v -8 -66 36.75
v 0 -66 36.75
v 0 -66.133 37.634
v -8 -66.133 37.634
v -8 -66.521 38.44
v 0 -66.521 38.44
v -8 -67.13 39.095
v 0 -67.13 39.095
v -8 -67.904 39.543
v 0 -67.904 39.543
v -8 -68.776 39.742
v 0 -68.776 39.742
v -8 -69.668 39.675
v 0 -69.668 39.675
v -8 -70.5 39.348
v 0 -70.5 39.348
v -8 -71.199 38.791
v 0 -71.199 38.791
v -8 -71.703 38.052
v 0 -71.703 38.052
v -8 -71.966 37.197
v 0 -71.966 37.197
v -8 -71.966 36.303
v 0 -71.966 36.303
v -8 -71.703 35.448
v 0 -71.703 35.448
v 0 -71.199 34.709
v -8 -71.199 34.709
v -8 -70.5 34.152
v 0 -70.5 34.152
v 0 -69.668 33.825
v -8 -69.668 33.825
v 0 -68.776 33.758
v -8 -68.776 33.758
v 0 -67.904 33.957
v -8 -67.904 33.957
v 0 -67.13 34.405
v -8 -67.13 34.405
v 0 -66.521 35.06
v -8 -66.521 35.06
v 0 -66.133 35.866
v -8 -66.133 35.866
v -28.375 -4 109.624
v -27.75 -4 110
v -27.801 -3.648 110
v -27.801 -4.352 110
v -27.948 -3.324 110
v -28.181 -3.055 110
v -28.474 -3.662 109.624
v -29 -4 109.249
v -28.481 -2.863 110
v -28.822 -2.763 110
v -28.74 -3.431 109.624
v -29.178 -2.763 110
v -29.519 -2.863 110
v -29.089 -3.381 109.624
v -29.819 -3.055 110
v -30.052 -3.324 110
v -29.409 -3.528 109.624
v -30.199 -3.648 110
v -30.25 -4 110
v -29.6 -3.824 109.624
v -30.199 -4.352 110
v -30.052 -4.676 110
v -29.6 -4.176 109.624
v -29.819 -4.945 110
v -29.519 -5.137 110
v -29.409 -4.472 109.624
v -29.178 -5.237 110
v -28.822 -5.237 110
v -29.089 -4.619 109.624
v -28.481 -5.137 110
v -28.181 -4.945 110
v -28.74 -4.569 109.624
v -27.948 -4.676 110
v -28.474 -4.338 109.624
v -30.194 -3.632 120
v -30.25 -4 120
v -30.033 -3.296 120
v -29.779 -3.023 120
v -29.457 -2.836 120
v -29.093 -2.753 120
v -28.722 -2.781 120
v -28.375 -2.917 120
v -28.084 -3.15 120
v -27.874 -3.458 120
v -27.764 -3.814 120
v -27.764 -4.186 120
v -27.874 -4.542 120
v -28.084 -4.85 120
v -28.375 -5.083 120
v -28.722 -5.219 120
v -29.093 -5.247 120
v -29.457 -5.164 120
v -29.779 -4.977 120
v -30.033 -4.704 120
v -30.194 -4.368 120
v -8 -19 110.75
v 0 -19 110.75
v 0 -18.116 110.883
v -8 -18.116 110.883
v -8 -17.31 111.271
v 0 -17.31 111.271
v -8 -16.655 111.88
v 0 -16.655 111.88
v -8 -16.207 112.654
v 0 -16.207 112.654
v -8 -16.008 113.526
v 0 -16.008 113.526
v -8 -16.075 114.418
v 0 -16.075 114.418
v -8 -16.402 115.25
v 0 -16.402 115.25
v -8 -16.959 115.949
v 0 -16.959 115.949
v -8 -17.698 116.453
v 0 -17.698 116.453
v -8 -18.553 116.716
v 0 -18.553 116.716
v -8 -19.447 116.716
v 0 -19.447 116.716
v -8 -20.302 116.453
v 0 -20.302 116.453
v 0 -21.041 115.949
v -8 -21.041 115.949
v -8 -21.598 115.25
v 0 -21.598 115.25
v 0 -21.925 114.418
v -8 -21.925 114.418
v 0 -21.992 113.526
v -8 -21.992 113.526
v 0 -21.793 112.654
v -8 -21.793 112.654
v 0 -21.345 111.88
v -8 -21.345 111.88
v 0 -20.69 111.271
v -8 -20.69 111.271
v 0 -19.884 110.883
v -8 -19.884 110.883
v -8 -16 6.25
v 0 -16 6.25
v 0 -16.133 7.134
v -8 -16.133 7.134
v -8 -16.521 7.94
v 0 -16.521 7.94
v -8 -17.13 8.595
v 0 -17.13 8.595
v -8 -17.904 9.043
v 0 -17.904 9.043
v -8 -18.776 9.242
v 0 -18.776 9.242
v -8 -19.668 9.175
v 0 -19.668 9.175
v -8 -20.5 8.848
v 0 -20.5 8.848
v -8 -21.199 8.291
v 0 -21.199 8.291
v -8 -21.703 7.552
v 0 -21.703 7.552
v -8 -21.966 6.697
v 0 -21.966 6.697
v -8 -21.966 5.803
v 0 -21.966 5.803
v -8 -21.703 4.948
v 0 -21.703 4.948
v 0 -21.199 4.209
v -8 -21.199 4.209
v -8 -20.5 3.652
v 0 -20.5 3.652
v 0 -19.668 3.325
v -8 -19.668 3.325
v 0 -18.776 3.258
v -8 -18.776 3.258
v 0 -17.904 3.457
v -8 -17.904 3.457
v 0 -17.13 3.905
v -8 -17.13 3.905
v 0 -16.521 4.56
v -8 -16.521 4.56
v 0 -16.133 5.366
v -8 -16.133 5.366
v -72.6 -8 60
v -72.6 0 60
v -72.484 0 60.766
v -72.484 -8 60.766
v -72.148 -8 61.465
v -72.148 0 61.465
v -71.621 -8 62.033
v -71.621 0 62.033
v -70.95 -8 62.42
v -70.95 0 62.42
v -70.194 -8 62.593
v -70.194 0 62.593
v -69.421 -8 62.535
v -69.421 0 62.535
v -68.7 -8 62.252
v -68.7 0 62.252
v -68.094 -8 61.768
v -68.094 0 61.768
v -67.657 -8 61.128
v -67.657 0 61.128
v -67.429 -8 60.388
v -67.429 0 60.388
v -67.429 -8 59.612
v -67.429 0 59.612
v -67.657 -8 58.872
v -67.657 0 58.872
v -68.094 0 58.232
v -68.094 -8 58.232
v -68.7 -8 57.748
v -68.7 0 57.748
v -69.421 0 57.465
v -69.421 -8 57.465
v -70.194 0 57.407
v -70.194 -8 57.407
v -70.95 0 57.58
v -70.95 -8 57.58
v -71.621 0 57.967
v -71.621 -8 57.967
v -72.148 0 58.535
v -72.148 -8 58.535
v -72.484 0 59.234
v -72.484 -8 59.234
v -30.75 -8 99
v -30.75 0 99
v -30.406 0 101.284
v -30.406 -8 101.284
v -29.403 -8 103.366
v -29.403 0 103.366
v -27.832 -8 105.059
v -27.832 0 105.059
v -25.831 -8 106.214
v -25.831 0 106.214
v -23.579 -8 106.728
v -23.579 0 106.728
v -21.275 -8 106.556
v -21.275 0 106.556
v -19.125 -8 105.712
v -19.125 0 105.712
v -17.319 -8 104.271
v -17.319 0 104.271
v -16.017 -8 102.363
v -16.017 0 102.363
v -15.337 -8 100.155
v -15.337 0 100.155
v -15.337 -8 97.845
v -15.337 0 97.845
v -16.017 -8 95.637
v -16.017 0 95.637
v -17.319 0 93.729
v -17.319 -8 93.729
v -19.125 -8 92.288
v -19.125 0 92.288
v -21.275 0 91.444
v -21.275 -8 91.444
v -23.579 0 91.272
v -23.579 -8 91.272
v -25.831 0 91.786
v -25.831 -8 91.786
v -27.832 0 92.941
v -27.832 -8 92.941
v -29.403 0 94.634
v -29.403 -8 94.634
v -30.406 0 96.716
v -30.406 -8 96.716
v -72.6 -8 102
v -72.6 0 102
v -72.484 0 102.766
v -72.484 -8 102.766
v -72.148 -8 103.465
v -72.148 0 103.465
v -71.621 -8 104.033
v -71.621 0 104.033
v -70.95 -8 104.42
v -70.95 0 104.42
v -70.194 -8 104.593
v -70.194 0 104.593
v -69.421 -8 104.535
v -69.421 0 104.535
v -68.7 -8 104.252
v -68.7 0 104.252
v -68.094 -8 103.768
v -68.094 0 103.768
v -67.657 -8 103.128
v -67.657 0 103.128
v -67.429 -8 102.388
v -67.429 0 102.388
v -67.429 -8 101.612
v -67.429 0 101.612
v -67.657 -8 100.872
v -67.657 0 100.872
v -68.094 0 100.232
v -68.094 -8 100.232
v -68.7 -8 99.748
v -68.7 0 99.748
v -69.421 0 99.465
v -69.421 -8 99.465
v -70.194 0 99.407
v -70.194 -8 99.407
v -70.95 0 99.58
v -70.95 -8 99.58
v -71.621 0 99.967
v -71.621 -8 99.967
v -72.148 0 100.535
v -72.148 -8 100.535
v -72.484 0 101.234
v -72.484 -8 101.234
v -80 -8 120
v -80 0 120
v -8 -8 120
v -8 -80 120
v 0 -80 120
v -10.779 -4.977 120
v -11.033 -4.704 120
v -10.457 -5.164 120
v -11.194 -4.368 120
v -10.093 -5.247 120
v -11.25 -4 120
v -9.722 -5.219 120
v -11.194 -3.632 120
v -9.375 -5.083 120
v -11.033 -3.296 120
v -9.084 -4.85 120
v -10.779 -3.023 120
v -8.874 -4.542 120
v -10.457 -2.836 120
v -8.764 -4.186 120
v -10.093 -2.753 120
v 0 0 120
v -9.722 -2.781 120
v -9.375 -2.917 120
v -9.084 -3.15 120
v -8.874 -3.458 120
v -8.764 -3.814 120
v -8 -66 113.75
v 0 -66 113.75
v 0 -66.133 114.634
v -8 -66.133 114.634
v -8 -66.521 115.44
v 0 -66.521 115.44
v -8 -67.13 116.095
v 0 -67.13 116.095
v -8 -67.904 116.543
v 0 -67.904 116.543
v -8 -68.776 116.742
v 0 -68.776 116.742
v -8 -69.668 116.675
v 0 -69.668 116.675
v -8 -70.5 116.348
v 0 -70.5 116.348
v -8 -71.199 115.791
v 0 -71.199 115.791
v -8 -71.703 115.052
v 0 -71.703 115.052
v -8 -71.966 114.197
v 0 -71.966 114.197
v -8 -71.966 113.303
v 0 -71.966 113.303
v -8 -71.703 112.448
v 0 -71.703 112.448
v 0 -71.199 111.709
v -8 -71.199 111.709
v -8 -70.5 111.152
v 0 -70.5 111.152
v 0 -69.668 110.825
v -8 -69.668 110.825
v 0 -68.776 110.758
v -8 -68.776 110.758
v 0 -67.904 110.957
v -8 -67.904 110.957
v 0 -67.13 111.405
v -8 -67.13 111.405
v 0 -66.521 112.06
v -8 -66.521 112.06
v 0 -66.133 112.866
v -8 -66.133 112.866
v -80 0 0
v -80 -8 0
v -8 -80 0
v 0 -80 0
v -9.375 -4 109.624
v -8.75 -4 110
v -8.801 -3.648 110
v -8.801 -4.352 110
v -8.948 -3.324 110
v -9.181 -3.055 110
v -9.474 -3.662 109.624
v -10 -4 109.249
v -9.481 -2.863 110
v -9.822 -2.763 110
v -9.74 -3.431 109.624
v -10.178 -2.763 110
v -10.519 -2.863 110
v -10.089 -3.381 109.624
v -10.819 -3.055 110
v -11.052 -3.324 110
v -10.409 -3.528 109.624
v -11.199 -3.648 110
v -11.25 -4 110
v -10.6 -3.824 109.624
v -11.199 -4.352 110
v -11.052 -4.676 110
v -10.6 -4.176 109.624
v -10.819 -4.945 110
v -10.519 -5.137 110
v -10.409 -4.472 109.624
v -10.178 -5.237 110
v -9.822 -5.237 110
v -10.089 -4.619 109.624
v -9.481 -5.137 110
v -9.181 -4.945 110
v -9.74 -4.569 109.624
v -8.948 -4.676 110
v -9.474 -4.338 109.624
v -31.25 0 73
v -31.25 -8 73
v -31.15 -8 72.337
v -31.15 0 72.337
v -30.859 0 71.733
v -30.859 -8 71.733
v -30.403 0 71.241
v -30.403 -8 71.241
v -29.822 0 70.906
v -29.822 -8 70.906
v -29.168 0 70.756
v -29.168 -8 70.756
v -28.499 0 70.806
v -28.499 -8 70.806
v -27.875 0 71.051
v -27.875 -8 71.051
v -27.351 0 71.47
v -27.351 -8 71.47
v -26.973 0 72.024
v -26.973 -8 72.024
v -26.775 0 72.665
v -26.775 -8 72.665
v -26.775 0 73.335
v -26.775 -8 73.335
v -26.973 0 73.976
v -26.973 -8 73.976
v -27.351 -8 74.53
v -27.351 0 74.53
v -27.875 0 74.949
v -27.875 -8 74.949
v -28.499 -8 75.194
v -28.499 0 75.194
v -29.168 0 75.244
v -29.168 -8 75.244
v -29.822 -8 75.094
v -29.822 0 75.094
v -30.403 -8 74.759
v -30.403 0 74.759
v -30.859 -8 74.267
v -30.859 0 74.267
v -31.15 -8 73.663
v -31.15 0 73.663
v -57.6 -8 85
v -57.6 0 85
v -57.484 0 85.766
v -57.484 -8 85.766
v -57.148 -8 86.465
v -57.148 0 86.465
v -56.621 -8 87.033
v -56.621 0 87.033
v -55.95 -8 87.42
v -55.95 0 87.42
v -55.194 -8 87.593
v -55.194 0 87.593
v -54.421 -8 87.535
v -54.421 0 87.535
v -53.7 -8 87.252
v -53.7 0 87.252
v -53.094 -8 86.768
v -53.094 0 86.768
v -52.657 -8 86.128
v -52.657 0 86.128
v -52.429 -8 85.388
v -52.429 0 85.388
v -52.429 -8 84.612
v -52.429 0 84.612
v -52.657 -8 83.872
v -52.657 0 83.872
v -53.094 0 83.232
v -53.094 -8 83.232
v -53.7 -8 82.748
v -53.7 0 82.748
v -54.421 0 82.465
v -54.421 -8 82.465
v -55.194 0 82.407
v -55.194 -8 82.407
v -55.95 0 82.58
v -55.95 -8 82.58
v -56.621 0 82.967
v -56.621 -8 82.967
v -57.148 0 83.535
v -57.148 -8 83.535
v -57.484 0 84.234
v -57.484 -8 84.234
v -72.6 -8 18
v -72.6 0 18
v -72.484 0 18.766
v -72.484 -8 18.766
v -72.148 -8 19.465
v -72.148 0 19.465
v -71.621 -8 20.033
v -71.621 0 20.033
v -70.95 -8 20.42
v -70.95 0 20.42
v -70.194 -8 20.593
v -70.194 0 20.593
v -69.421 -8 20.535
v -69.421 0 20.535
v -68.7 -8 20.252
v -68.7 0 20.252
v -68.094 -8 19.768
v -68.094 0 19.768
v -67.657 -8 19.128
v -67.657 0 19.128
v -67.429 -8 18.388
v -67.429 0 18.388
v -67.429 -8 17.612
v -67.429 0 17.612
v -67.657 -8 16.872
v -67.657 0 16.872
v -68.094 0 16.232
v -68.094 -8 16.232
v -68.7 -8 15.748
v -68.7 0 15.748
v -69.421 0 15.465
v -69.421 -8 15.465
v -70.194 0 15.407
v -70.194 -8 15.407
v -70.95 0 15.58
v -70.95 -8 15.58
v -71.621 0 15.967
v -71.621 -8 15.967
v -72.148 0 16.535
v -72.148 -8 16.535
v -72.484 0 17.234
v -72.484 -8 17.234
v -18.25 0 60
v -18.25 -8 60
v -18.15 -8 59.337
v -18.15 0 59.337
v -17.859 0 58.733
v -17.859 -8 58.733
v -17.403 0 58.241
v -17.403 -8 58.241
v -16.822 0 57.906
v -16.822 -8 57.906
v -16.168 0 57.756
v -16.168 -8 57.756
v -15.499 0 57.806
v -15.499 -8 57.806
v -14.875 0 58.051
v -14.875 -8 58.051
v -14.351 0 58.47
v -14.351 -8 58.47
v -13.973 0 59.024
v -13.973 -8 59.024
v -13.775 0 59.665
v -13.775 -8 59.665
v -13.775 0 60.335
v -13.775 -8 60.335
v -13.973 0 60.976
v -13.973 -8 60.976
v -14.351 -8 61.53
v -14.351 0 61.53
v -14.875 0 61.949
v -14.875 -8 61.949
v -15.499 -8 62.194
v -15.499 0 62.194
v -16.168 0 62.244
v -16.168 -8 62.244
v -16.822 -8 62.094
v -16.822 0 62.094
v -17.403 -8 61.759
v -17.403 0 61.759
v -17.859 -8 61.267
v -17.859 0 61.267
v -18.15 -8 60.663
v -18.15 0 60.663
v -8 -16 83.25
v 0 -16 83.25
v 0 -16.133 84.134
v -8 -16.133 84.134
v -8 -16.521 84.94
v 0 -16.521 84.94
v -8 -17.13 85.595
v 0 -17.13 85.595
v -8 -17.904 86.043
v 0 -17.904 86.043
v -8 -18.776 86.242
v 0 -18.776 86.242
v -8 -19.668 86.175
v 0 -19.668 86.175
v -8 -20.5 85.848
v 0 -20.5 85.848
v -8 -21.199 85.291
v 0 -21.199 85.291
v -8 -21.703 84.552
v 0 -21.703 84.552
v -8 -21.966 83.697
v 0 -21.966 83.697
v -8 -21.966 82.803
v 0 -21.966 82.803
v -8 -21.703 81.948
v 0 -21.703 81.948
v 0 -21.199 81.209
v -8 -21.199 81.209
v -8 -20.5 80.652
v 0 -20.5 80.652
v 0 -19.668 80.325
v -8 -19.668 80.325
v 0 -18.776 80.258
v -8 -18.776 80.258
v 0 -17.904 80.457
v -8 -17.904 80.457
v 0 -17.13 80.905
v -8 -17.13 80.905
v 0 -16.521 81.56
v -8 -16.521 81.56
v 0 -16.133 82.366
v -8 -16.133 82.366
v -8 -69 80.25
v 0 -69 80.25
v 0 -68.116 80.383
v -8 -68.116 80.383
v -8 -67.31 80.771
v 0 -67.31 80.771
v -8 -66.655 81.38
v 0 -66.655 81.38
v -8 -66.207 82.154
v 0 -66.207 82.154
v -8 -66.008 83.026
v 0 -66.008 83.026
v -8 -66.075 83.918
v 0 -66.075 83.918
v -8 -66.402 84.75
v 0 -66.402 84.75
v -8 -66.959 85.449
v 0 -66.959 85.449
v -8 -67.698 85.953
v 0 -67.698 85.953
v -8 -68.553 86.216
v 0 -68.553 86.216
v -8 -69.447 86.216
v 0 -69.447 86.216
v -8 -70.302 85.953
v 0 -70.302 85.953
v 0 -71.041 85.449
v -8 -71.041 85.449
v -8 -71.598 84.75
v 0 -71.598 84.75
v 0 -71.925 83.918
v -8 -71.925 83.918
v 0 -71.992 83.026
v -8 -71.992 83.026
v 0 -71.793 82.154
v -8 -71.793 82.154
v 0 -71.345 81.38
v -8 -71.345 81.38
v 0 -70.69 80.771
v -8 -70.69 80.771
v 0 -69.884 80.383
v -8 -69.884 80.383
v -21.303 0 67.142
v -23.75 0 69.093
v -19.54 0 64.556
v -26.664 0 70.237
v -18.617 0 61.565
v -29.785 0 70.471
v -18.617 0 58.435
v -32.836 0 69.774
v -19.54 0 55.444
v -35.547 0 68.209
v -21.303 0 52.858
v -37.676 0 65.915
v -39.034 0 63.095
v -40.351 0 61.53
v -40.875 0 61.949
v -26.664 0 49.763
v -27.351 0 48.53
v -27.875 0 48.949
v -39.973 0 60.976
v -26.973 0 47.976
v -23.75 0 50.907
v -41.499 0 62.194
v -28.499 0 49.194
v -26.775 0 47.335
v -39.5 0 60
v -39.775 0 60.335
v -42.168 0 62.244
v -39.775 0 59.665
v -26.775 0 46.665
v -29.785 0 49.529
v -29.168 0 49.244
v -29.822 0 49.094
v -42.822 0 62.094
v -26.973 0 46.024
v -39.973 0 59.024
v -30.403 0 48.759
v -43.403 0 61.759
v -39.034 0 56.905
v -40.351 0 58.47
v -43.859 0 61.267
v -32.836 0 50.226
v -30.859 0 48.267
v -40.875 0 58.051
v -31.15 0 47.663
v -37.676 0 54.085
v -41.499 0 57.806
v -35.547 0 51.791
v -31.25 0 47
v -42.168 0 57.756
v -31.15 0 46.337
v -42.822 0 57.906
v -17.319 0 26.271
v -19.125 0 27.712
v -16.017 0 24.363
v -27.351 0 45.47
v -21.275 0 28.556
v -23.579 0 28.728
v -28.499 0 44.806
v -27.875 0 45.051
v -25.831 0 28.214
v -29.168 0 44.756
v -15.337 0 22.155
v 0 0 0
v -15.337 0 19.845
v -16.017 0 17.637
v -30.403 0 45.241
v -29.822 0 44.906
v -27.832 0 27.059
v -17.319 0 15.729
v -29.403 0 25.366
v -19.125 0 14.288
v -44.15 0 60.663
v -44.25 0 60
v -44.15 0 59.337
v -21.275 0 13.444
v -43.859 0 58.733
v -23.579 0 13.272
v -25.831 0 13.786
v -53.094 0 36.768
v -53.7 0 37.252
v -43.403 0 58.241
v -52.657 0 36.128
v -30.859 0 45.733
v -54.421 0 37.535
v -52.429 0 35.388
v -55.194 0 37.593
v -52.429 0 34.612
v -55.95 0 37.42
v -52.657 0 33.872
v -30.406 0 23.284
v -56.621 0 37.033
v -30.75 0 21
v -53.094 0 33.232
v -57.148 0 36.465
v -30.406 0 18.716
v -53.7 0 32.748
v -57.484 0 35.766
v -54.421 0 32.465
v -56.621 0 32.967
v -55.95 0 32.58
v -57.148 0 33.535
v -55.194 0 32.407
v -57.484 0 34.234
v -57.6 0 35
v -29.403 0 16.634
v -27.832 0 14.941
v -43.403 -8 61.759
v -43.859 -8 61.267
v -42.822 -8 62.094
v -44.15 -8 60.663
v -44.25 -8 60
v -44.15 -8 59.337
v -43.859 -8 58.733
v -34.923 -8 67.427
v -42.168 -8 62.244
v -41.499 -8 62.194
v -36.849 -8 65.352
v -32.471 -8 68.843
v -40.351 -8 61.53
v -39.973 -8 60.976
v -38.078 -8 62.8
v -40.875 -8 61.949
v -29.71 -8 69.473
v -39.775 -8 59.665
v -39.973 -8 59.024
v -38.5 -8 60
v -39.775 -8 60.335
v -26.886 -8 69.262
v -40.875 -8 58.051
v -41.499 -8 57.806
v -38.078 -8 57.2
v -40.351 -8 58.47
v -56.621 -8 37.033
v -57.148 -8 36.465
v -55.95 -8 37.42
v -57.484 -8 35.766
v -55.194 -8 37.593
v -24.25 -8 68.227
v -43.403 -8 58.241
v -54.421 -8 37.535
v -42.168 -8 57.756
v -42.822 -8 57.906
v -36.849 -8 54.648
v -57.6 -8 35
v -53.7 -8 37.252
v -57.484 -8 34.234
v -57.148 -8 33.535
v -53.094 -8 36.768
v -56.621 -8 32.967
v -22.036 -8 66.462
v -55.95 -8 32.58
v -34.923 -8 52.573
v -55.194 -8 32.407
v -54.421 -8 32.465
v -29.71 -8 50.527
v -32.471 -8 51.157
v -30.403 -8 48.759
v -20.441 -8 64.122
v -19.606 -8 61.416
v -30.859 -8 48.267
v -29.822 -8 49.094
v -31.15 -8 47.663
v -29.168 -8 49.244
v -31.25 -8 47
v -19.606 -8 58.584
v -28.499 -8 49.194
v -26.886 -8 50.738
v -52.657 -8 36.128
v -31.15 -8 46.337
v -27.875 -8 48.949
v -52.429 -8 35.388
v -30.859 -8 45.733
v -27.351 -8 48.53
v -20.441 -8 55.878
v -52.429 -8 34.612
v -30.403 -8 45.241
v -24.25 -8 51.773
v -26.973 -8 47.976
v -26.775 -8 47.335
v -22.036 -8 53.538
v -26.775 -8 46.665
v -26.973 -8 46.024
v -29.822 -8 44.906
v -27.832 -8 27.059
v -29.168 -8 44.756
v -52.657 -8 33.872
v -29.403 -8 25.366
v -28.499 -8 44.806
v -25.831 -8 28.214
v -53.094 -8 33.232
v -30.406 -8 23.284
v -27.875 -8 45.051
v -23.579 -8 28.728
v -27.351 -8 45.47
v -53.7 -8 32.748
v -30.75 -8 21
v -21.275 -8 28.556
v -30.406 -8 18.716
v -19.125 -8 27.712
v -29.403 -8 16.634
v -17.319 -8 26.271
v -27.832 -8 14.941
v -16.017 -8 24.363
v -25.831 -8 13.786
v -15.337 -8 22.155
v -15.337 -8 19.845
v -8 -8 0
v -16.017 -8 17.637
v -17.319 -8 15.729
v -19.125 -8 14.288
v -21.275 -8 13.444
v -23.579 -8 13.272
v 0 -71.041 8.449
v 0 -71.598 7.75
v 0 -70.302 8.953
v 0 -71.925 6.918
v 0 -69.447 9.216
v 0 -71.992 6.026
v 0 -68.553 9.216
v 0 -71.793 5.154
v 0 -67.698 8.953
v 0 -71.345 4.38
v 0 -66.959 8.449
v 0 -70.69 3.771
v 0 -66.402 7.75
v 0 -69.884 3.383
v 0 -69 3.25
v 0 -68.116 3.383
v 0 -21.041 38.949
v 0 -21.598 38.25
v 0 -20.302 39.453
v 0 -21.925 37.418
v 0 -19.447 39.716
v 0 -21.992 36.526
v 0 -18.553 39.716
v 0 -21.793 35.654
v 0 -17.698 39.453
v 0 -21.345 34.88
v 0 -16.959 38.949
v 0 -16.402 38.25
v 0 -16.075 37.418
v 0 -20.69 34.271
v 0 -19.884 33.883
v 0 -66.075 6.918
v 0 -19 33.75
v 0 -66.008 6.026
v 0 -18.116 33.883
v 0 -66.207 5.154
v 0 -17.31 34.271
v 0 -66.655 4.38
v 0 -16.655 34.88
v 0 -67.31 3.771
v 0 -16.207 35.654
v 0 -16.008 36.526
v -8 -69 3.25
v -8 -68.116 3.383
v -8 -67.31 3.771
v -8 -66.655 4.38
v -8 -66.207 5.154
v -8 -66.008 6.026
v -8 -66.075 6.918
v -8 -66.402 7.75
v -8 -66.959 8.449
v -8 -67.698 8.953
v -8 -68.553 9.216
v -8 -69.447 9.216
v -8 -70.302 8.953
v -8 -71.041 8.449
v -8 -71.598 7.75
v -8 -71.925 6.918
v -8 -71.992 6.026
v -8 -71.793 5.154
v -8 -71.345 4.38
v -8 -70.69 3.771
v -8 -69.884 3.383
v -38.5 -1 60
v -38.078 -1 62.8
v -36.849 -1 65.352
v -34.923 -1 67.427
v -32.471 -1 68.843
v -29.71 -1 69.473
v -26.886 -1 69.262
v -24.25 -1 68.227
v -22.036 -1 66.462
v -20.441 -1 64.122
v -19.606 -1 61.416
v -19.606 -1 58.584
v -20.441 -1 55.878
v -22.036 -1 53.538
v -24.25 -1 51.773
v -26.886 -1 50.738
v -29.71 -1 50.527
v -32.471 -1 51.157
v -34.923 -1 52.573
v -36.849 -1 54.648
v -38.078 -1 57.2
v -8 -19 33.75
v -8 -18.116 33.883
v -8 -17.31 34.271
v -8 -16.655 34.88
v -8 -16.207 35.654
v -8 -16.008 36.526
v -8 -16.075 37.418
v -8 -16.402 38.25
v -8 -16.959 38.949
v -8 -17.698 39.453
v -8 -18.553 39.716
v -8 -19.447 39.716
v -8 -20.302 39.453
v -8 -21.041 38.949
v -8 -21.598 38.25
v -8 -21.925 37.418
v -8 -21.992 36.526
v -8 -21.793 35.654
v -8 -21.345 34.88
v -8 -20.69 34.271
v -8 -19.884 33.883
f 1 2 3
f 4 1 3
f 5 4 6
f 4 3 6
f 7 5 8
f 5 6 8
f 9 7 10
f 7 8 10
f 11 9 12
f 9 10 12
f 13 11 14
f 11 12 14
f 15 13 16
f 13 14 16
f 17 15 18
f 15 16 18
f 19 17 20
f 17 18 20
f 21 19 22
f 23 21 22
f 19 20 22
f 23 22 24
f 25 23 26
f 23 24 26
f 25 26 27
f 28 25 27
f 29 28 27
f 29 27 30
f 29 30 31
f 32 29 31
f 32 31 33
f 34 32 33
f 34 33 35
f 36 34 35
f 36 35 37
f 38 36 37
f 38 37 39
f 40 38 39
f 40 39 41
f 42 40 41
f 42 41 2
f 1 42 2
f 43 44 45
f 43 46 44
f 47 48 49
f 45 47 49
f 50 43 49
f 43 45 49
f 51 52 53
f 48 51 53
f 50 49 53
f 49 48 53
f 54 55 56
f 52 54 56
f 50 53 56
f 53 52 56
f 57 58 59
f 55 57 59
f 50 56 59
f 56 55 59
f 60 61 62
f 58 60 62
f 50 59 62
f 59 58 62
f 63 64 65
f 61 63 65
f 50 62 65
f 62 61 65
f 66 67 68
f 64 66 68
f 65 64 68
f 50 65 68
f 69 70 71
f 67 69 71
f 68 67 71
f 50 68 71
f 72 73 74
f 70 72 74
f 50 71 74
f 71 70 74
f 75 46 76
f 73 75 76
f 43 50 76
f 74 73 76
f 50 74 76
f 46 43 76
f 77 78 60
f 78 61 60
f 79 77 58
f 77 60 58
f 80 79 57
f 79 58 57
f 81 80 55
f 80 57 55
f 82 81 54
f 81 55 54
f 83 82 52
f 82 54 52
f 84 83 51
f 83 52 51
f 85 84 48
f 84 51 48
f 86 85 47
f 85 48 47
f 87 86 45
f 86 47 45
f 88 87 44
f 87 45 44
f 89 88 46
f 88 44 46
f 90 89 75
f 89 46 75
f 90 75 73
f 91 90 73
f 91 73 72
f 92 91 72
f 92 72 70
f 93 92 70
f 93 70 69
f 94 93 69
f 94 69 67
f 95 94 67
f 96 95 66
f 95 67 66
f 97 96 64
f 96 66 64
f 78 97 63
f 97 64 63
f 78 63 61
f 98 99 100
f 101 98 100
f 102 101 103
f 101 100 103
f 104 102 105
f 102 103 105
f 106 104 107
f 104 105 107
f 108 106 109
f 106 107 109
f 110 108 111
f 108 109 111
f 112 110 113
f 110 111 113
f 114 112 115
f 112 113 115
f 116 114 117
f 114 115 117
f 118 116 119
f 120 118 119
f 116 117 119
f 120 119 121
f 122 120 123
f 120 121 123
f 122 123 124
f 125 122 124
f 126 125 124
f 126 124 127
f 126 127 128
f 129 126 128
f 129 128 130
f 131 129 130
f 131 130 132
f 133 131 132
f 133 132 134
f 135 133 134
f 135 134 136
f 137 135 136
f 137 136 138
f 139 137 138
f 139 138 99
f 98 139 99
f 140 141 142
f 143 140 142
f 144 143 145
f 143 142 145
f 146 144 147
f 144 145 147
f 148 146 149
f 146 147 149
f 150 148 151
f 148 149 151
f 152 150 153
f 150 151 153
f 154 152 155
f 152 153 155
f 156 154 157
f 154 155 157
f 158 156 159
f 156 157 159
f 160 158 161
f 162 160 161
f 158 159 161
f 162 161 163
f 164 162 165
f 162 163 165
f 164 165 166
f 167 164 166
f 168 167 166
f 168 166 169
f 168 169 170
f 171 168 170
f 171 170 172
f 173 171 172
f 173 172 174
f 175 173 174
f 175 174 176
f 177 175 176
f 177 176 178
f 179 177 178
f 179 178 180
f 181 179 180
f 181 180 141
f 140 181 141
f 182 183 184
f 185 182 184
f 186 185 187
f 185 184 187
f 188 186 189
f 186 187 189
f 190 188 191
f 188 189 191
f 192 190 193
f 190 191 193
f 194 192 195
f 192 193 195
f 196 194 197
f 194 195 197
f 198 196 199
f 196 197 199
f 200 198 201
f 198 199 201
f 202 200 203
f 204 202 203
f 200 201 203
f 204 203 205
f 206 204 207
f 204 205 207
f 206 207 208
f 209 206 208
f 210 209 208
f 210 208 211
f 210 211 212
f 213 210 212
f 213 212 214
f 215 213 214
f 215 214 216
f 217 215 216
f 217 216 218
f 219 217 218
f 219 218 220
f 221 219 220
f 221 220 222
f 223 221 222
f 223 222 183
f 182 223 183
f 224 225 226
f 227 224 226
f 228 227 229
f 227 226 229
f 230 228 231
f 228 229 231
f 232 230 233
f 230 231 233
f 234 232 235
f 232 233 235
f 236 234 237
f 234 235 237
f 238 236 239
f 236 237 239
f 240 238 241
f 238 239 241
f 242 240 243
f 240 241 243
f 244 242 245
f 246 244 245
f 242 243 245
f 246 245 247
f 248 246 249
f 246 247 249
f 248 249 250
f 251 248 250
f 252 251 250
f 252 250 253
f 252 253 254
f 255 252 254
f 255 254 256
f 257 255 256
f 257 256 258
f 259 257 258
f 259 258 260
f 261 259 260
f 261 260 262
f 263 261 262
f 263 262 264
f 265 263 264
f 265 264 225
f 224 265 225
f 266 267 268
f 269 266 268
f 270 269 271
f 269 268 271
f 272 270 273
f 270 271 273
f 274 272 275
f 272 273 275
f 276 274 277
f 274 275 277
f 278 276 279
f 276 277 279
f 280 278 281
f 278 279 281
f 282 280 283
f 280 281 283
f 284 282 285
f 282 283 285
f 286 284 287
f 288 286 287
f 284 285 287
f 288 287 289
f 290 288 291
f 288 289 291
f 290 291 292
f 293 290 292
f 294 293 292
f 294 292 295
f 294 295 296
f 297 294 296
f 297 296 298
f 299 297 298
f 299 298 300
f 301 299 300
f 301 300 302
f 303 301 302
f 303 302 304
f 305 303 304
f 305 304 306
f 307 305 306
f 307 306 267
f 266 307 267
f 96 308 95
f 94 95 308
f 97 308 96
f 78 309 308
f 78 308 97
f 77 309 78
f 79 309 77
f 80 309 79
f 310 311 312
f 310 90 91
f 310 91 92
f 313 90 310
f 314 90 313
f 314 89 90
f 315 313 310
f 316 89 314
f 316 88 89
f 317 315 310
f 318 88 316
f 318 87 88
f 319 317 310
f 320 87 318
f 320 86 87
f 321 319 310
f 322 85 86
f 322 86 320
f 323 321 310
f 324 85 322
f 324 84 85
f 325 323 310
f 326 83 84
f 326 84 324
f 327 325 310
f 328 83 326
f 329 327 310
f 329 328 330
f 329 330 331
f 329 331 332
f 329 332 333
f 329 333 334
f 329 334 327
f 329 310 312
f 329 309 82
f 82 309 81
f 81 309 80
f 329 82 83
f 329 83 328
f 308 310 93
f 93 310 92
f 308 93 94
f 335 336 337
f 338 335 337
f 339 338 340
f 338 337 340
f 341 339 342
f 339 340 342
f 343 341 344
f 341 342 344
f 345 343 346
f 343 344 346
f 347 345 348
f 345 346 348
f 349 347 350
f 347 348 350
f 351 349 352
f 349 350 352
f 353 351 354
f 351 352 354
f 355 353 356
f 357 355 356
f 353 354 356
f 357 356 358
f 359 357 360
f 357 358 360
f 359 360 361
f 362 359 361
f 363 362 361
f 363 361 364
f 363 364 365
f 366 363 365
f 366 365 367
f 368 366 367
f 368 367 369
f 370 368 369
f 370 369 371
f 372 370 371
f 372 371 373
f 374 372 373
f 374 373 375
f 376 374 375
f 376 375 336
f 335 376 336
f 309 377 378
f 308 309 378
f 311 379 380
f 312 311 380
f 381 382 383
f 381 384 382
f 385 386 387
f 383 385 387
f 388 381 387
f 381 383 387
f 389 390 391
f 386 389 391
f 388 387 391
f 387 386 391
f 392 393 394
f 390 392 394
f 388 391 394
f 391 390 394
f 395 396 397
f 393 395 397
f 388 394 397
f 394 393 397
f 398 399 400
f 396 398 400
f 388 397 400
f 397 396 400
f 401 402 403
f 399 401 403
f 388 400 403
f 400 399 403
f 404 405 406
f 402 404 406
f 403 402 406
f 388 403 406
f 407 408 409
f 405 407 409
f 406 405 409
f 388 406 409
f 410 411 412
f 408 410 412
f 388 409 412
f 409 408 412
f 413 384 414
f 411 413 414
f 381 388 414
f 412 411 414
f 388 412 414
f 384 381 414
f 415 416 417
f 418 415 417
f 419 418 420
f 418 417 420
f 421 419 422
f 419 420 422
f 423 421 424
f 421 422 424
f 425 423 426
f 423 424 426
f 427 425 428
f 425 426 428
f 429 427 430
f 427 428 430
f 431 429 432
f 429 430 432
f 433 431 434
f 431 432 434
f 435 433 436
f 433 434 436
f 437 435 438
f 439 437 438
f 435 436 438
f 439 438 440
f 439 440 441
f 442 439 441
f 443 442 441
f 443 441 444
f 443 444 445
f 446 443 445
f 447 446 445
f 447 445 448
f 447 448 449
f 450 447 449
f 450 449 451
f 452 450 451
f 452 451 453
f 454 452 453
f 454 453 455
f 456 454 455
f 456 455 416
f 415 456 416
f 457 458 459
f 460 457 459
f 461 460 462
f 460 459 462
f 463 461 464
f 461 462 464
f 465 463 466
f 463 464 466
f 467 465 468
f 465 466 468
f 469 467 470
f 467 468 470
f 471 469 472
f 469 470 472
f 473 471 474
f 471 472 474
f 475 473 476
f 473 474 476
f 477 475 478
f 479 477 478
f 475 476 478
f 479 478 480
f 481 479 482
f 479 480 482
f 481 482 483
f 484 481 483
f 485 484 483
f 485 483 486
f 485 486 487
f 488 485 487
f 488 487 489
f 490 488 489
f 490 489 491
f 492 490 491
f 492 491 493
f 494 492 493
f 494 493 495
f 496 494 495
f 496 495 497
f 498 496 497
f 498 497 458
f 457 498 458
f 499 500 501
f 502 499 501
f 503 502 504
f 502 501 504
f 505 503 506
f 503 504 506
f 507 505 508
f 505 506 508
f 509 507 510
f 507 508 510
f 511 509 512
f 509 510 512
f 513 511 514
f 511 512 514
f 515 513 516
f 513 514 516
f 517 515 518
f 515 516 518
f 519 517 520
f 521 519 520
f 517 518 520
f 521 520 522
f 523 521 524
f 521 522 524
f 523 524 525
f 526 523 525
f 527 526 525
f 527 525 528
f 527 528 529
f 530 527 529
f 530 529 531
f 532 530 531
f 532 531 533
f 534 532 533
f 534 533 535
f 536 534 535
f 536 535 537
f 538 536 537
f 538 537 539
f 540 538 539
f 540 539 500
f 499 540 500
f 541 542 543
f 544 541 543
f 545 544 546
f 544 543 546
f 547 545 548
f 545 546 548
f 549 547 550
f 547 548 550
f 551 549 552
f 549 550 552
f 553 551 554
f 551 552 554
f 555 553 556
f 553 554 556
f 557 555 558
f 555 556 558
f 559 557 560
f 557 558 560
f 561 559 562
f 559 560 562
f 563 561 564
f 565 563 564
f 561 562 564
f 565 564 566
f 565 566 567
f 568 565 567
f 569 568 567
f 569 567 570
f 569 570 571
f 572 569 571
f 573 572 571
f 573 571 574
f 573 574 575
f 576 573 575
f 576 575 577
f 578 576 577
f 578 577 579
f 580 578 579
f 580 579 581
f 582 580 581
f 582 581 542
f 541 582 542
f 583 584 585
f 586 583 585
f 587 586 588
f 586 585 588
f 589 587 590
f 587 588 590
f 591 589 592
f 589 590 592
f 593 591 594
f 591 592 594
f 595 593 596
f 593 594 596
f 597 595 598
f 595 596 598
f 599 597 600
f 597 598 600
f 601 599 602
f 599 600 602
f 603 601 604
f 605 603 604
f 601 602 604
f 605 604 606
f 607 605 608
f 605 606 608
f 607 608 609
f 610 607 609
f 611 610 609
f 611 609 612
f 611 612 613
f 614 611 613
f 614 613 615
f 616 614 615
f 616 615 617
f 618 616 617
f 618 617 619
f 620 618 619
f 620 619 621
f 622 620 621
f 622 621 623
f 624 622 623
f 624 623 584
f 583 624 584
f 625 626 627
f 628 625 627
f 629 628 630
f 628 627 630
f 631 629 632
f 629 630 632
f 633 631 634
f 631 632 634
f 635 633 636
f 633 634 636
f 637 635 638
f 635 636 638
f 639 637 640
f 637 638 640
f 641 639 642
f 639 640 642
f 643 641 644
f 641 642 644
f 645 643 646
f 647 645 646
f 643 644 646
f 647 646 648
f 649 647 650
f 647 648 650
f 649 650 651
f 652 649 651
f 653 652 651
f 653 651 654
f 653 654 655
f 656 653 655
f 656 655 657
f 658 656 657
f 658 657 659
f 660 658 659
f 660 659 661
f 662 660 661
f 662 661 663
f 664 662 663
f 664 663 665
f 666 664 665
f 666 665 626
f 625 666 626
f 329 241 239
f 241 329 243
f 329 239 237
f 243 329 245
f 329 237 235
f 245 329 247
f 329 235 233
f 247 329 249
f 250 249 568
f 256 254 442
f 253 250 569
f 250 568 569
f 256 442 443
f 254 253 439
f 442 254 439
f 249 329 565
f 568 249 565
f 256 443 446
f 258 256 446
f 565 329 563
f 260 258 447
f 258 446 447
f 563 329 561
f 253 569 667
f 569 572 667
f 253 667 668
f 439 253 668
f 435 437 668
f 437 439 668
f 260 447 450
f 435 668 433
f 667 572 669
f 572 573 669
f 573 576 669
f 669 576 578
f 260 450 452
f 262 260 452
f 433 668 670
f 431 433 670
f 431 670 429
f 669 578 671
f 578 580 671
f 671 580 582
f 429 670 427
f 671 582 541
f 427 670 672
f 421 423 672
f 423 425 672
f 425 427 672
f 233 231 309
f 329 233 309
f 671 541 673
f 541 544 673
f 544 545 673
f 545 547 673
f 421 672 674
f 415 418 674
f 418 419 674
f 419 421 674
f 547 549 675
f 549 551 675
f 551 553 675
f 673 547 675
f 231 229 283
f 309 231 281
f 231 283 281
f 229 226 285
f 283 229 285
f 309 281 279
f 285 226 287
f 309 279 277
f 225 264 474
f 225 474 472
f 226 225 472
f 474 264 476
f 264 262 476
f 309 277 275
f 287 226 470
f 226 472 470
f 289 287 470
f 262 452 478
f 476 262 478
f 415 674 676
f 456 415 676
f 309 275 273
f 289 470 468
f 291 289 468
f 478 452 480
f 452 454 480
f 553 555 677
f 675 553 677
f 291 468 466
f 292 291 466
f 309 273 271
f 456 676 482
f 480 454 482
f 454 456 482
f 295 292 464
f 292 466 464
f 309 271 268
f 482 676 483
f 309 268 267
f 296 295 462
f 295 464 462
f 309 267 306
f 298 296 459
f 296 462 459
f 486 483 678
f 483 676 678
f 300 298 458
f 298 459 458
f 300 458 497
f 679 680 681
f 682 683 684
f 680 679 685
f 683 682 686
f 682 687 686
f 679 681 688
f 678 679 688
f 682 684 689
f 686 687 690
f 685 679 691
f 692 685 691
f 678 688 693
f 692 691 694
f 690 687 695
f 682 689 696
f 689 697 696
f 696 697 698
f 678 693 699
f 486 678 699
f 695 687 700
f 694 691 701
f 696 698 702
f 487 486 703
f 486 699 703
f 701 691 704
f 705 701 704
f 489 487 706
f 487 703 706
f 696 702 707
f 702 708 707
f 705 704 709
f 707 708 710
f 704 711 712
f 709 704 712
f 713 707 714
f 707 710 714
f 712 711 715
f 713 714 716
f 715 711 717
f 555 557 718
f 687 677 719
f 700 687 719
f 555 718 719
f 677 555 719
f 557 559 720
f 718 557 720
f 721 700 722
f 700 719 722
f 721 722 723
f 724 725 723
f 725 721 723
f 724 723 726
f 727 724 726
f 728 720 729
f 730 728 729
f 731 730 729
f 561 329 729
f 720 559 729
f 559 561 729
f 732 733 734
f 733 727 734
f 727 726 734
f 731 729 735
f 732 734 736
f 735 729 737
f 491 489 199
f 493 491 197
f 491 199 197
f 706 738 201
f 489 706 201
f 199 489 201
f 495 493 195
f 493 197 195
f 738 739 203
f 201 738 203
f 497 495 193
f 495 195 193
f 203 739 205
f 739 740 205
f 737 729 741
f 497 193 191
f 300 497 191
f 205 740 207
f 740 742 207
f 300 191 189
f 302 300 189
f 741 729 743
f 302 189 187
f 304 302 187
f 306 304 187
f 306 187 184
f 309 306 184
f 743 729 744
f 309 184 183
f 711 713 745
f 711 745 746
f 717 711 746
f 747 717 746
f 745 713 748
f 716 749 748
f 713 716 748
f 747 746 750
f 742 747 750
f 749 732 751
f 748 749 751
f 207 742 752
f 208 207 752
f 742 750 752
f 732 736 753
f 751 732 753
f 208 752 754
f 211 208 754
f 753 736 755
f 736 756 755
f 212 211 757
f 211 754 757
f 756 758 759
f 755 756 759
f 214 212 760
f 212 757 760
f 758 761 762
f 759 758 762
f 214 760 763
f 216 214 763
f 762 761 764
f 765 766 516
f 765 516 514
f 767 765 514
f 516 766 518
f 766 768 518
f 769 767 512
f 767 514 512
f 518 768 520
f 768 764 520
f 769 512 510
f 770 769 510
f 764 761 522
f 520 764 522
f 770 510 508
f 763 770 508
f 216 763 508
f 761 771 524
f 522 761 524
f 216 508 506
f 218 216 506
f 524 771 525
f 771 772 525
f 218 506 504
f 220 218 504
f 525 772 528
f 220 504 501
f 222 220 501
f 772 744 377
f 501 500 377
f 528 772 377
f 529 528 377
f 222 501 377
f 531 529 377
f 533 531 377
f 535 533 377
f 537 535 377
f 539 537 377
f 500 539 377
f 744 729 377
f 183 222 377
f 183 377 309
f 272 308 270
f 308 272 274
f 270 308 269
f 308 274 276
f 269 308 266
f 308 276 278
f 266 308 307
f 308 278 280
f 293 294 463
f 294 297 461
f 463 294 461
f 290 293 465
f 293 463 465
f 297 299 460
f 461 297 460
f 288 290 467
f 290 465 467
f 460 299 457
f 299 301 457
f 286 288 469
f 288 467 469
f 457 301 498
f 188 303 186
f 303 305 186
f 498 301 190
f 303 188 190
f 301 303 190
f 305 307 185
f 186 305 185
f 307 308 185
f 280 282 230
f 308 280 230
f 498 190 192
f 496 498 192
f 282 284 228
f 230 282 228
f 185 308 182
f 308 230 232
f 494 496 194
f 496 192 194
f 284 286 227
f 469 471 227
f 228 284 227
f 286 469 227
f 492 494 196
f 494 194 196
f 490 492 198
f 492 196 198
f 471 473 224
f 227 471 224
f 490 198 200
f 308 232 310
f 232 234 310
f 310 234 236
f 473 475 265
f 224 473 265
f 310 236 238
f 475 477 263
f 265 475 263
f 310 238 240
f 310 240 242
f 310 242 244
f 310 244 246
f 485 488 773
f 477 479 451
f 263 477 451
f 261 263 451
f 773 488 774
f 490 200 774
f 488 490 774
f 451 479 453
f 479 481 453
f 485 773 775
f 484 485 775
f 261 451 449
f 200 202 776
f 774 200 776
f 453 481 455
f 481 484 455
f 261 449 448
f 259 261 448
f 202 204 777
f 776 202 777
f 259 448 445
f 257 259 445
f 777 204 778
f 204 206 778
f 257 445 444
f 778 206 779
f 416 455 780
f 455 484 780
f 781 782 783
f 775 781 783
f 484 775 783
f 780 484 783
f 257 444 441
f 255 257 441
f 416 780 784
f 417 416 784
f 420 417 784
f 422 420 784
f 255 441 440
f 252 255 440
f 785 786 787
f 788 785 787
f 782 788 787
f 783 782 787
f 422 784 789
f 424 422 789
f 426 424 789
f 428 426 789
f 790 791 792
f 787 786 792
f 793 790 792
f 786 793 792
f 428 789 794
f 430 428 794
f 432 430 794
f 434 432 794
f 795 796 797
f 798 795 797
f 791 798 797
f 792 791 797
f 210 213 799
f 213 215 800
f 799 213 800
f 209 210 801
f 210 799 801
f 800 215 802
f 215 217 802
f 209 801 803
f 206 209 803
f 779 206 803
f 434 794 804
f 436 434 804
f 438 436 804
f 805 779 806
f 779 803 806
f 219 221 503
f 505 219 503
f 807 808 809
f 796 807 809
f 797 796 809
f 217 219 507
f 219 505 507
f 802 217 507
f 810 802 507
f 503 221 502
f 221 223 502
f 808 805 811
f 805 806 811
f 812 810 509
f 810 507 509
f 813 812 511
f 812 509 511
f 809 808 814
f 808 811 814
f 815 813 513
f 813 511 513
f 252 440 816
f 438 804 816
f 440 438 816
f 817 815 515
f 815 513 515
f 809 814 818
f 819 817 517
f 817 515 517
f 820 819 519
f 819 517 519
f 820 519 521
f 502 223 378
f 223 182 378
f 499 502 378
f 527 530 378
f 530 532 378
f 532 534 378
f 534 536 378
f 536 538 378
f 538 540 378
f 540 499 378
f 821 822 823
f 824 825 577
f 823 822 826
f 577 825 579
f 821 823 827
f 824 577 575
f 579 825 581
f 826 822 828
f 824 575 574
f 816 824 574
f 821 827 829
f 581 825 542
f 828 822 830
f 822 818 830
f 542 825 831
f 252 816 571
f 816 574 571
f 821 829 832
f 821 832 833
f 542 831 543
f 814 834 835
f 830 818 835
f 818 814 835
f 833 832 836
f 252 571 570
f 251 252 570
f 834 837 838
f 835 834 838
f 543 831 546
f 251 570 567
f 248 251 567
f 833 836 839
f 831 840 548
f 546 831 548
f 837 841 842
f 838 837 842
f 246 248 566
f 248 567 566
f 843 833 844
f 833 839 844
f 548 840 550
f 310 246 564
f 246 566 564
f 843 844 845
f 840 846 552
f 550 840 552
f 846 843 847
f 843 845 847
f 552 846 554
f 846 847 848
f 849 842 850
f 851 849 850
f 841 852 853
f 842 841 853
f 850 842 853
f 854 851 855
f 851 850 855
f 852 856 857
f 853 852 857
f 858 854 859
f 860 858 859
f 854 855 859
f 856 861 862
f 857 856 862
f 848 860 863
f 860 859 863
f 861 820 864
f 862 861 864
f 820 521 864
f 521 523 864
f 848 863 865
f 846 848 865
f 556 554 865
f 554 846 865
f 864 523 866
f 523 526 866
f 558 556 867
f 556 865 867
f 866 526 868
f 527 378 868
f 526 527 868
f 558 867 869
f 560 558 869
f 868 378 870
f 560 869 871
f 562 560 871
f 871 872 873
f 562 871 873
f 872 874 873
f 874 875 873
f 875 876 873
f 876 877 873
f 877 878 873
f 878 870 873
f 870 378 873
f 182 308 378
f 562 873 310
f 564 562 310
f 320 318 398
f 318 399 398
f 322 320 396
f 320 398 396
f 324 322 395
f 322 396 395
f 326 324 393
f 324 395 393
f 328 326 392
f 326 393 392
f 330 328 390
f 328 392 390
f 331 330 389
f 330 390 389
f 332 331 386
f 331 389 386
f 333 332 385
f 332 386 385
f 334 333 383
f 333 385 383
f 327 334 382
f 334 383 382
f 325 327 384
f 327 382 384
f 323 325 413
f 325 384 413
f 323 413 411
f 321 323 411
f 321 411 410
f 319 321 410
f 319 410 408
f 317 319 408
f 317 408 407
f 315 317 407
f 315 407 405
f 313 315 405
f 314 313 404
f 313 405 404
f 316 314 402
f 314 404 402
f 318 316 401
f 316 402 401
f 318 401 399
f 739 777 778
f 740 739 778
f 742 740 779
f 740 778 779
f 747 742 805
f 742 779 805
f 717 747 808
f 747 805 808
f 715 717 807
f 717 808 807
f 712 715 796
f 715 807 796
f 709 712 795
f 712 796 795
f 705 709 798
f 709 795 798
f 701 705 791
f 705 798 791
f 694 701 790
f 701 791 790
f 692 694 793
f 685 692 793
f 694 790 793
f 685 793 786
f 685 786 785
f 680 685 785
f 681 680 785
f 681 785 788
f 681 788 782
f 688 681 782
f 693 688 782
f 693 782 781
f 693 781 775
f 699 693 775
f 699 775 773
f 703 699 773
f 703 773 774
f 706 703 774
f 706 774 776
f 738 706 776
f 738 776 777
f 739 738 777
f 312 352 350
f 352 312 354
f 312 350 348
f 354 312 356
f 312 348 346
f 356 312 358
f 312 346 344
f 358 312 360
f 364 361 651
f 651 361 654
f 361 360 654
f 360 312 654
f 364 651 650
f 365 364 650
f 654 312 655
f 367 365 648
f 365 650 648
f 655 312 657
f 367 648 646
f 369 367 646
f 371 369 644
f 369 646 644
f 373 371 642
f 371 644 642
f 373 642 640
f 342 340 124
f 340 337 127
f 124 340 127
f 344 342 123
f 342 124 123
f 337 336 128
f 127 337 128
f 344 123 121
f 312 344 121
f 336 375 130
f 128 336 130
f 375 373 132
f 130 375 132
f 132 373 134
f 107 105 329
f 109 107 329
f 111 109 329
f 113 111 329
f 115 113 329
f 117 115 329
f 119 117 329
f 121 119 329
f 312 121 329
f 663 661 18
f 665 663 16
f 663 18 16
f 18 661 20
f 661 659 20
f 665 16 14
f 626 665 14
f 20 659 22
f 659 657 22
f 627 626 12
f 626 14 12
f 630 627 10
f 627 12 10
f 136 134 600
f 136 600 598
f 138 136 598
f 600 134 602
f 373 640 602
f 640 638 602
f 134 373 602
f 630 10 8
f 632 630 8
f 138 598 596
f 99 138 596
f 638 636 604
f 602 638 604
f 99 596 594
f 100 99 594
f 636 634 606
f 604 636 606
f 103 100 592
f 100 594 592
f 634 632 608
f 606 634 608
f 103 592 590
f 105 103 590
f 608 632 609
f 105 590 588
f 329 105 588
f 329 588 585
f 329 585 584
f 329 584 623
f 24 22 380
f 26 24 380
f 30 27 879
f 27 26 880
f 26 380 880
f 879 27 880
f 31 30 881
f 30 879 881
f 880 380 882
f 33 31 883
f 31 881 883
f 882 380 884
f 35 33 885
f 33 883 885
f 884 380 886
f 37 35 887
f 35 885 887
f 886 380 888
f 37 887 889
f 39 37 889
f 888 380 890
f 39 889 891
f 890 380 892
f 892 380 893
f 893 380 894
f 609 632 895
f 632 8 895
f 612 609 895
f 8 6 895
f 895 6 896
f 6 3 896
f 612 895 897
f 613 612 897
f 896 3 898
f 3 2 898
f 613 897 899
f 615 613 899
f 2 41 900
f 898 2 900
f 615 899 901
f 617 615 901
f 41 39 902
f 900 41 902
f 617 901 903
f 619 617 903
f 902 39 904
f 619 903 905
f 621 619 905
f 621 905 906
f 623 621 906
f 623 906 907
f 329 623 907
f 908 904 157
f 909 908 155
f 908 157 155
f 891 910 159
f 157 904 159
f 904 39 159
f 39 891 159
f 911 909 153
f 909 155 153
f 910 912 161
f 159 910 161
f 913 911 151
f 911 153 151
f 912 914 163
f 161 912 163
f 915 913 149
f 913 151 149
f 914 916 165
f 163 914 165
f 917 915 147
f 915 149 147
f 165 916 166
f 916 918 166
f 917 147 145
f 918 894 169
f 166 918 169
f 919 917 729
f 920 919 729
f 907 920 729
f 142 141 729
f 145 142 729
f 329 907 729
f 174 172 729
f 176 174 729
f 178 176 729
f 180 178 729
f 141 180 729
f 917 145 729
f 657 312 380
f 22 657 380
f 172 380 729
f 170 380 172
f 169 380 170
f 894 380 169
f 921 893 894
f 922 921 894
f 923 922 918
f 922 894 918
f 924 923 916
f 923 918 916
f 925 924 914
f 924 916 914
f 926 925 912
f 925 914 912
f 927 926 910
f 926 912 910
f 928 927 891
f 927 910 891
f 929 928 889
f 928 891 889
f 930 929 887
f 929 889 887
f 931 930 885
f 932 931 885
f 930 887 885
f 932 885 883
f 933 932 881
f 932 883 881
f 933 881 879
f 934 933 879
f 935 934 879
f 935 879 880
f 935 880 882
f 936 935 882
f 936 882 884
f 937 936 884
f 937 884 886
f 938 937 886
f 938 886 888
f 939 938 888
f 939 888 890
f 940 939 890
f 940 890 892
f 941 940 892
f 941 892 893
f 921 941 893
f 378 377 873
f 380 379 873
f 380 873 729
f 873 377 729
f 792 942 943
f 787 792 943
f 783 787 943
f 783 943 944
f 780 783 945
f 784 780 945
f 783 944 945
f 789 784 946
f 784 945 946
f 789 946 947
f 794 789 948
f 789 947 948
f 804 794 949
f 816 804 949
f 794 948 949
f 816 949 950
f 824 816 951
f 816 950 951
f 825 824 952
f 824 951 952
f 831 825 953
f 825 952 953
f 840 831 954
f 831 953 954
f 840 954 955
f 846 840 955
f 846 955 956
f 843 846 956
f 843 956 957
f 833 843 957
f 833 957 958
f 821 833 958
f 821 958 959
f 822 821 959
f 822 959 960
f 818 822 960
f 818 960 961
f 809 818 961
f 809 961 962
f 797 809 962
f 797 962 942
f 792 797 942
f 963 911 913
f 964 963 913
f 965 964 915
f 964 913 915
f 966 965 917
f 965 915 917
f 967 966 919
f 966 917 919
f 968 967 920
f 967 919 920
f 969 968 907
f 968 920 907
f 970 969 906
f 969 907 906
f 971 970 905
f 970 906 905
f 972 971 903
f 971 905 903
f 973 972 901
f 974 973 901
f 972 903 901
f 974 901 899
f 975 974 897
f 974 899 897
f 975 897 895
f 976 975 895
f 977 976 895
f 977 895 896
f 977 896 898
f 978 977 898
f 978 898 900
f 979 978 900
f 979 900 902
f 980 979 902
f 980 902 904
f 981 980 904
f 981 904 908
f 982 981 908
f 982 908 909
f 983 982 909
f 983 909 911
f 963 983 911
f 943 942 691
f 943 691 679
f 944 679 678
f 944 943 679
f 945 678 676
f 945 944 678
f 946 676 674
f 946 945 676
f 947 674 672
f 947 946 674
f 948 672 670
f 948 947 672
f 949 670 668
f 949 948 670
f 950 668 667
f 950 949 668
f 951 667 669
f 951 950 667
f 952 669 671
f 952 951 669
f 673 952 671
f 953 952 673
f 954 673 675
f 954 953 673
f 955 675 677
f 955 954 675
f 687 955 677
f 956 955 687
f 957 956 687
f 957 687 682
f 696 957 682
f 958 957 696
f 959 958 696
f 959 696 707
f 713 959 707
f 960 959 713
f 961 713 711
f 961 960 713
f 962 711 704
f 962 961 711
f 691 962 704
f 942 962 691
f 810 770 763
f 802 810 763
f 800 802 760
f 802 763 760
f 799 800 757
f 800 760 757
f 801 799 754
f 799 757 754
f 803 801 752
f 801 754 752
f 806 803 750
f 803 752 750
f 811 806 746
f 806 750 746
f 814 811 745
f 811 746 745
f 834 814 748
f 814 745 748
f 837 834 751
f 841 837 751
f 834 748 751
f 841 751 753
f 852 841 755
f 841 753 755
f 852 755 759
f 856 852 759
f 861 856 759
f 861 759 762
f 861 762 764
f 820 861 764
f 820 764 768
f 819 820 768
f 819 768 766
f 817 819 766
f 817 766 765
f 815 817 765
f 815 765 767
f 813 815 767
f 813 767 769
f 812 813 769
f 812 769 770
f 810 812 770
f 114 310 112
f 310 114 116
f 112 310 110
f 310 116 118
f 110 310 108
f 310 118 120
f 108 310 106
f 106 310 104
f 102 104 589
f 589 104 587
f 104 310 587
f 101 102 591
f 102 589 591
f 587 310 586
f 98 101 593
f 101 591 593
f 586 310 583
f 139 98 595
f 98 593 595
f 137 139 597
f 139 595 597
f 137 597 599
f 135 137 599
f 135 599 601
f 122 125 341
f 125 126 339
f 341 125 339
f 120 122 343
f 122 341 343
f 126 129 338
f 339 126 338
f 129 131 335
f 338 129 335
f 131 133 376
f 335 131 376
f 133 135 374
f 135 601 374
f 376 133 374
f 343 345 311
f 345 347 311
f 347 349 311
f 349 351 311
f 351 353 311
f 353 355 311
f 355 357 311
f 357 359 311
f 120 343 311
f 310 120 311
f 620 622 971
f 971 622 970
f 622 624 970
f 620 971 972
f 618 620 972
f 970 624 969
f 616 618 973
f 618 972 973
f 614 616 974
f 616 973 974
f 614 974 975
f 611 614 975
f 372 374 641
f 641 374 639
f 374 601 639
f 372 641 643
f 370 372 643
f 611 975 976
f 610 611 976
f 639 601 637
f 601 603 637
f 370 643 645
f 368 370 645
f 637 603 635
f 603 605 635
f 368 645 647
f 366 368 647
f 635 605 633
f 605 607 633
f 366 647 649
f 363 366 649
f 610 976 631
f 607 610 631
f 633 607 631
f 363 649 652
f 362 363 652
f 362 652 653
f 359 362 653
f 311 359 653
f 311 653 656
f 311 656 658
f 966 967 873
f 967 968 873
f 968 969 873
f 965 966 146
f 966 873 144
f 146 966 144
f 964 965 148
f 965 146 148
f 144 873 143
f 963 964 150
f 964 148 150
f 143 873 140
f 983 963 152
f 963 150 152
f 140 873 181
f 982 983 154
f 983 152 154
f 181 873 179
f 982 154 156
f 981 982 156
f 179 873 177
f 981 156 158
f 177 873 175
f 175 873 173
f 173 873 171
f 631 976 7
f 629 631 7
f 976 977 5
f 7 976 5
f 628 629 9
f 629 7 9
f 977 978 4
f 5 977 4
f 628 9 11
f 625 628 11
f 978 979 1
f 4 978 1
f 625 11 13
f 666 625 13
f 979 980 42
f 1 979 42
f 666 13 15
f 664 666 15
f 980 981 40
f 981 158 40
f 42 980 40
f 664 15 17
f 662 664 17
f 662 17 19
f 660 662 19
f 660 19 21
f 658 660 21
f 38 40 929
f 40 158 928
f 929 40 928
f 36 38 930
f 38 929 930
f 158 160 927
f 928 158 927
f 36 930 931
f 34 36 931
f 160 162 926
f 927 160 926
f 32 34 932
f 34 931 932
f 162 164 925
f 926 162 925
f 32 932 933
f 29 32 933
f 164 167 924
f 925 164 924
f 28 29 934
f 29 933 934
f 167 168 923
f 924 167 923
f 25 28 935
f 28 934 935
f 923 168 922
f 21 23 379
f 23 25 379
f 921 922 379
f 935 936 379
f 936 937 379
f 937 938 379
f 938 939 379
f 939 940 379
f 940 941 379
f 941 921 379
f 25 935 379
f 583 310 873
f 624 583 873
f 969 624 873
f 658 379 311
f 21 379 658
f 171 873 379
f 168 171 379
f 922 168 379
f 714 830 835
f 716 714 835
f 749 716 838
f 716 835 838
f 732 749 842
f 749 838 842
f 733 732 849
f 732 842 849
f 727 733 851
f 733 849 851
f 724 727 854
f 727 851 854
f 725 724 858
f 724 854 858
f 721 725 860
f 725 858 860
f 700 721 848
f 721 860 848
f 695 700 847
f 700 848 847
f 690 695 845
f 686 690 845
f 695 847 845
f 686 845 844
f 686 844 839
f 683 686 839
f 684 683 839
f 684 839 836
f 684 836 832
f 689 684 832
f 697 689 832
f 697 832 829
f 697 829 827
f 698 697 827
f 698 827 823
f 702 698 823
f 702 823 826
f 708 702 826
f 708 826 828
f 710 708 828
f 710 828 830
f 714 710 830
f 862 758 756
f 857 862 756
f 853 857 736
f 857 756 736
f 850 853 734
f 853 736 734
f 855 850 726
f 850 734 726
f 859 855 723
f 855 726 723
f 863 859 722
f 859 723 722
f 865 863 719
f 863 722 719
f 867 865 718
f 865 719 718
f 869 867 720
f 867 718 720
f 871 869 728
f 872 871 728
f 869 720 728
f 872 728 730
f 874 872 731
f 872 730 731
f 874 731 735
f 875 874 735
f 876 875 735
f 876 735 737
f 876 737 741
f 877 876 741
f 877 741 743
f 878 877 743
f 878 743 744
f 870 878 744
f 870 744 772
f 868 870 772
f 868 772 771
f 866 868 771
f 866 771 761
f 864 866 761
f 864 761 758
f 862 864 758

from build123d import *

# Parameters (mm, degrees)
ESTRUSIONE_ESTRUSIONE1_DEPTH = 120
TAGLIO_ESTRUSIONE2_REACH     = 166.924
SCHIZZO6_R                   = 7.75
TAGLIO_ESTRUSIONE3_REACH     = 166.924
SCHIZZO7_R                   = 9.5
FORO_PER_VITE_M4_2_D         = 4.5
SCHIZZO12_R                  = 3
TAGLIO_ESTRUSIONE4_DEPTH     = 10
SCHIZZO14_R                  = 2.6
TAGLIO_ESTRUSIONE5_DEPTH     = 10
SMUSSO2_SIZE                 = 1
FORO_FILETTATO_M3_1_D        = 2.5
FORO_FILETTATO_M3_1_DEPTH    = 10
FORO_FILETTATO_M3_1_TIP      = 0.751075774


with BuildPart() as part:
    # Schizzo1 → Estrusione-Estrusione1 (new body)
    with BuildSketch(Plane.XY):
        Polygon((0, 0), (-80, 0), (-80, -8), (-8, -8), (-8, -80), (0, -80), align=None)
    extrude(amount=ESTRUSIONE_ESTRUSIONE1_DEPTH)

    # Schizzo6 → Taglio-Estrusione2 (cut, up to next)
    with BuildSketch(Plane(origin=(0, 0, 0), x_dir=(1, 0, 0), z_dir=(0, 1, 0)), mode=Mode.PRIVATE) as taglio_estrusione2_sk1:
        with Locations(Location((-23, -21, 0), (0, 0, 180))):
            Circle(SCHIZZO6_R)
    taglio_estrusione2_tool1 = extrude(taglio_estrusione2_sk1.sketch, amount=-TAGLIO_ESTRUSIONE2_REACH, mode=Mode.PRIVATE) & part.part
    # Schizzo6 → Taglio-Estrusione2 (cut, up to next)
    with BuildSketch(Plane(origin=(0, 0, 0), x_dir=(1, 0, 0), z_dir=(0, 1, 0)), mode=Mode.PRIVATE) as taglio_estrusione2_sk2:
        with Locations(Location((-23, -99, 0), (0, 0, 180))):
            Circle(SCHIZZO6_R)
    taglio_estrusione2_tool2 = extrude(taglio_estrusione2_sk2.sketch, amount=-TAGLIO_ESTRUSIONE2_REACH, mode=Mode.PRIVATE) & part.part
    add(taglio_estrusione2_tool1.solids().sort_by_distance((-23, 0, 21))[0], mode=Mode.SUBTRACT)
    add(taglio_estrusione2_tool2.solids().sort_by_distance((-23, 0, 99))[0], mode=Mode.SUBTRACT)

    # Schizzo7 → Taglio-Estrusione3 (cut, up to next)
    with BuildSketch(Plane(origin=(0, 0, 0), x_dir=(1, 0, 0), z_dir=(0, 1, 0)), mode=Mode.PRIVATE) as taglio_estrusione3_sk1:
        with Locations(Location((-29, -60, 0), (0, 0, 180))):
            Circle(SCHIZZO7_R)
    taglio_estrusione3_tool1 = extrude(taglio_estrusione3_sk1.sketch, amount=-TAGLIO_ESTRUSIONE3_REACH, mode=Mode.PRIVATE) & part.part
    add(taglio_estrusione3_tool1.solids().sort_by_distance((-29, 0, 60))[0], mode=Mode.SUBTRACT)

    # Foro per Vite M4-2 (through all)
    with Locations(Plane(origin=(0, 0, 0), x_dir=(1, 0, 0), z_dir=(0, 1, 0))):
        with Locations((-29, -47), (-42, -60), (-29, -73), (-16, -60), (-29, -60)):
            Hole(FORO_PER_VITE_M4_2_D / 2)

    # Schizzo12 → Taglio-Estrusione4 (cut)
    with BuildSketch(Plane(origin=(0, 0, 0), x_dir=(0, 0, -1), z_dir=(1, 0, 0))):
        with Locations((-113.75, -19)):
            Circle(SCHIZZO12_R)
        with Locations(Location((-83.25, -19, 0), (0, 0, 90))):
            Circle(SCHIZZO12_R)
        with Locations((-36.75, -19)):
            Circle(SCHIZZO12_R)
        with Locations(Location((-6.25, -19, 0), (0, 0, 90))):
            Circle(SCHIZZO12_R)
        with Locations((-83.25, -69)):
            Circle(SCHIZZO12_R)
        with Locations(Location((-113.75, -69, 0), (0, 0, 90))):
            Circle(SCHIZZO12_R)
        with Locations((-6.25, -69)):
            Circle(SCHIZZO12_R)
        with Locations(Location((-36.75, -69, 0), (0, 0, 90))):
            Circle(SCHIZZO12_R)
    extrude(amount=-TAGLIO_ESTRUSIONE4_DEPTH, mode=Mode.SUBTRACT)

    # Schizzo14 → Taglio-Estrusione5 (cut)
    with BuildSketch(Plane(origin=(0, 0, 0), x_dir=(1, 0, 0), z_dir=(0, 1, 0))):
        with Locations(Location((-70, -18, 0), (0, 0, 180))):
            Circle(SCHIZZO14_R)
        with Locations(Location((-70, -60, 0), (0, 0, 180))):
            Circle(SCHIZZO14_R)
        with Locations(Location((-70, -102, 0), (0, 0, 180))):
            Circle(SCHIZZO14_R)
        with Locations(Location((-55, -35, 0), (0, 0, 180))):
            Circle(SCHIZZO14_R)
        with Locations(Location((-55, -85, 0), (0, 0, 180))):
            Circle(SCHIZZO14_R)
    extrude(amount=-TAGLIO_ESTRUSIONE5_DEPTH, mode=Mode.SUBTRACT)

    # Smusso2
    smusso2_edges = [part.edges().sort_by_distance(p)[0] for p in [
        (-19.5, 0, 60),
    ]]
    chamfer(smusso2_edges, length=SMUSSO2_SIZE)

    # Foro filettato M3-1
    with Locations(Plane.XY.offset(120)):
        with Locations((-10, -4), (-29, -4)):
            Hole(FORO_FILETTATO_M3_1_D / 2, depth=FORO_FILETTATO_M3_1_DEPTH)
            with Locations((0, 0, -(FORO_FILETTATO_M3_1_DEPTH + FORO_FILETTATO_M3_1_TIP / 2))):  # 118° drill point
                Cone(0, FORO_FILETTATO_M3_1_D / 2, FORO_FILETTATO_M3_1_TIP, mode=Mode.SUBTRACT)


solid = part.part
